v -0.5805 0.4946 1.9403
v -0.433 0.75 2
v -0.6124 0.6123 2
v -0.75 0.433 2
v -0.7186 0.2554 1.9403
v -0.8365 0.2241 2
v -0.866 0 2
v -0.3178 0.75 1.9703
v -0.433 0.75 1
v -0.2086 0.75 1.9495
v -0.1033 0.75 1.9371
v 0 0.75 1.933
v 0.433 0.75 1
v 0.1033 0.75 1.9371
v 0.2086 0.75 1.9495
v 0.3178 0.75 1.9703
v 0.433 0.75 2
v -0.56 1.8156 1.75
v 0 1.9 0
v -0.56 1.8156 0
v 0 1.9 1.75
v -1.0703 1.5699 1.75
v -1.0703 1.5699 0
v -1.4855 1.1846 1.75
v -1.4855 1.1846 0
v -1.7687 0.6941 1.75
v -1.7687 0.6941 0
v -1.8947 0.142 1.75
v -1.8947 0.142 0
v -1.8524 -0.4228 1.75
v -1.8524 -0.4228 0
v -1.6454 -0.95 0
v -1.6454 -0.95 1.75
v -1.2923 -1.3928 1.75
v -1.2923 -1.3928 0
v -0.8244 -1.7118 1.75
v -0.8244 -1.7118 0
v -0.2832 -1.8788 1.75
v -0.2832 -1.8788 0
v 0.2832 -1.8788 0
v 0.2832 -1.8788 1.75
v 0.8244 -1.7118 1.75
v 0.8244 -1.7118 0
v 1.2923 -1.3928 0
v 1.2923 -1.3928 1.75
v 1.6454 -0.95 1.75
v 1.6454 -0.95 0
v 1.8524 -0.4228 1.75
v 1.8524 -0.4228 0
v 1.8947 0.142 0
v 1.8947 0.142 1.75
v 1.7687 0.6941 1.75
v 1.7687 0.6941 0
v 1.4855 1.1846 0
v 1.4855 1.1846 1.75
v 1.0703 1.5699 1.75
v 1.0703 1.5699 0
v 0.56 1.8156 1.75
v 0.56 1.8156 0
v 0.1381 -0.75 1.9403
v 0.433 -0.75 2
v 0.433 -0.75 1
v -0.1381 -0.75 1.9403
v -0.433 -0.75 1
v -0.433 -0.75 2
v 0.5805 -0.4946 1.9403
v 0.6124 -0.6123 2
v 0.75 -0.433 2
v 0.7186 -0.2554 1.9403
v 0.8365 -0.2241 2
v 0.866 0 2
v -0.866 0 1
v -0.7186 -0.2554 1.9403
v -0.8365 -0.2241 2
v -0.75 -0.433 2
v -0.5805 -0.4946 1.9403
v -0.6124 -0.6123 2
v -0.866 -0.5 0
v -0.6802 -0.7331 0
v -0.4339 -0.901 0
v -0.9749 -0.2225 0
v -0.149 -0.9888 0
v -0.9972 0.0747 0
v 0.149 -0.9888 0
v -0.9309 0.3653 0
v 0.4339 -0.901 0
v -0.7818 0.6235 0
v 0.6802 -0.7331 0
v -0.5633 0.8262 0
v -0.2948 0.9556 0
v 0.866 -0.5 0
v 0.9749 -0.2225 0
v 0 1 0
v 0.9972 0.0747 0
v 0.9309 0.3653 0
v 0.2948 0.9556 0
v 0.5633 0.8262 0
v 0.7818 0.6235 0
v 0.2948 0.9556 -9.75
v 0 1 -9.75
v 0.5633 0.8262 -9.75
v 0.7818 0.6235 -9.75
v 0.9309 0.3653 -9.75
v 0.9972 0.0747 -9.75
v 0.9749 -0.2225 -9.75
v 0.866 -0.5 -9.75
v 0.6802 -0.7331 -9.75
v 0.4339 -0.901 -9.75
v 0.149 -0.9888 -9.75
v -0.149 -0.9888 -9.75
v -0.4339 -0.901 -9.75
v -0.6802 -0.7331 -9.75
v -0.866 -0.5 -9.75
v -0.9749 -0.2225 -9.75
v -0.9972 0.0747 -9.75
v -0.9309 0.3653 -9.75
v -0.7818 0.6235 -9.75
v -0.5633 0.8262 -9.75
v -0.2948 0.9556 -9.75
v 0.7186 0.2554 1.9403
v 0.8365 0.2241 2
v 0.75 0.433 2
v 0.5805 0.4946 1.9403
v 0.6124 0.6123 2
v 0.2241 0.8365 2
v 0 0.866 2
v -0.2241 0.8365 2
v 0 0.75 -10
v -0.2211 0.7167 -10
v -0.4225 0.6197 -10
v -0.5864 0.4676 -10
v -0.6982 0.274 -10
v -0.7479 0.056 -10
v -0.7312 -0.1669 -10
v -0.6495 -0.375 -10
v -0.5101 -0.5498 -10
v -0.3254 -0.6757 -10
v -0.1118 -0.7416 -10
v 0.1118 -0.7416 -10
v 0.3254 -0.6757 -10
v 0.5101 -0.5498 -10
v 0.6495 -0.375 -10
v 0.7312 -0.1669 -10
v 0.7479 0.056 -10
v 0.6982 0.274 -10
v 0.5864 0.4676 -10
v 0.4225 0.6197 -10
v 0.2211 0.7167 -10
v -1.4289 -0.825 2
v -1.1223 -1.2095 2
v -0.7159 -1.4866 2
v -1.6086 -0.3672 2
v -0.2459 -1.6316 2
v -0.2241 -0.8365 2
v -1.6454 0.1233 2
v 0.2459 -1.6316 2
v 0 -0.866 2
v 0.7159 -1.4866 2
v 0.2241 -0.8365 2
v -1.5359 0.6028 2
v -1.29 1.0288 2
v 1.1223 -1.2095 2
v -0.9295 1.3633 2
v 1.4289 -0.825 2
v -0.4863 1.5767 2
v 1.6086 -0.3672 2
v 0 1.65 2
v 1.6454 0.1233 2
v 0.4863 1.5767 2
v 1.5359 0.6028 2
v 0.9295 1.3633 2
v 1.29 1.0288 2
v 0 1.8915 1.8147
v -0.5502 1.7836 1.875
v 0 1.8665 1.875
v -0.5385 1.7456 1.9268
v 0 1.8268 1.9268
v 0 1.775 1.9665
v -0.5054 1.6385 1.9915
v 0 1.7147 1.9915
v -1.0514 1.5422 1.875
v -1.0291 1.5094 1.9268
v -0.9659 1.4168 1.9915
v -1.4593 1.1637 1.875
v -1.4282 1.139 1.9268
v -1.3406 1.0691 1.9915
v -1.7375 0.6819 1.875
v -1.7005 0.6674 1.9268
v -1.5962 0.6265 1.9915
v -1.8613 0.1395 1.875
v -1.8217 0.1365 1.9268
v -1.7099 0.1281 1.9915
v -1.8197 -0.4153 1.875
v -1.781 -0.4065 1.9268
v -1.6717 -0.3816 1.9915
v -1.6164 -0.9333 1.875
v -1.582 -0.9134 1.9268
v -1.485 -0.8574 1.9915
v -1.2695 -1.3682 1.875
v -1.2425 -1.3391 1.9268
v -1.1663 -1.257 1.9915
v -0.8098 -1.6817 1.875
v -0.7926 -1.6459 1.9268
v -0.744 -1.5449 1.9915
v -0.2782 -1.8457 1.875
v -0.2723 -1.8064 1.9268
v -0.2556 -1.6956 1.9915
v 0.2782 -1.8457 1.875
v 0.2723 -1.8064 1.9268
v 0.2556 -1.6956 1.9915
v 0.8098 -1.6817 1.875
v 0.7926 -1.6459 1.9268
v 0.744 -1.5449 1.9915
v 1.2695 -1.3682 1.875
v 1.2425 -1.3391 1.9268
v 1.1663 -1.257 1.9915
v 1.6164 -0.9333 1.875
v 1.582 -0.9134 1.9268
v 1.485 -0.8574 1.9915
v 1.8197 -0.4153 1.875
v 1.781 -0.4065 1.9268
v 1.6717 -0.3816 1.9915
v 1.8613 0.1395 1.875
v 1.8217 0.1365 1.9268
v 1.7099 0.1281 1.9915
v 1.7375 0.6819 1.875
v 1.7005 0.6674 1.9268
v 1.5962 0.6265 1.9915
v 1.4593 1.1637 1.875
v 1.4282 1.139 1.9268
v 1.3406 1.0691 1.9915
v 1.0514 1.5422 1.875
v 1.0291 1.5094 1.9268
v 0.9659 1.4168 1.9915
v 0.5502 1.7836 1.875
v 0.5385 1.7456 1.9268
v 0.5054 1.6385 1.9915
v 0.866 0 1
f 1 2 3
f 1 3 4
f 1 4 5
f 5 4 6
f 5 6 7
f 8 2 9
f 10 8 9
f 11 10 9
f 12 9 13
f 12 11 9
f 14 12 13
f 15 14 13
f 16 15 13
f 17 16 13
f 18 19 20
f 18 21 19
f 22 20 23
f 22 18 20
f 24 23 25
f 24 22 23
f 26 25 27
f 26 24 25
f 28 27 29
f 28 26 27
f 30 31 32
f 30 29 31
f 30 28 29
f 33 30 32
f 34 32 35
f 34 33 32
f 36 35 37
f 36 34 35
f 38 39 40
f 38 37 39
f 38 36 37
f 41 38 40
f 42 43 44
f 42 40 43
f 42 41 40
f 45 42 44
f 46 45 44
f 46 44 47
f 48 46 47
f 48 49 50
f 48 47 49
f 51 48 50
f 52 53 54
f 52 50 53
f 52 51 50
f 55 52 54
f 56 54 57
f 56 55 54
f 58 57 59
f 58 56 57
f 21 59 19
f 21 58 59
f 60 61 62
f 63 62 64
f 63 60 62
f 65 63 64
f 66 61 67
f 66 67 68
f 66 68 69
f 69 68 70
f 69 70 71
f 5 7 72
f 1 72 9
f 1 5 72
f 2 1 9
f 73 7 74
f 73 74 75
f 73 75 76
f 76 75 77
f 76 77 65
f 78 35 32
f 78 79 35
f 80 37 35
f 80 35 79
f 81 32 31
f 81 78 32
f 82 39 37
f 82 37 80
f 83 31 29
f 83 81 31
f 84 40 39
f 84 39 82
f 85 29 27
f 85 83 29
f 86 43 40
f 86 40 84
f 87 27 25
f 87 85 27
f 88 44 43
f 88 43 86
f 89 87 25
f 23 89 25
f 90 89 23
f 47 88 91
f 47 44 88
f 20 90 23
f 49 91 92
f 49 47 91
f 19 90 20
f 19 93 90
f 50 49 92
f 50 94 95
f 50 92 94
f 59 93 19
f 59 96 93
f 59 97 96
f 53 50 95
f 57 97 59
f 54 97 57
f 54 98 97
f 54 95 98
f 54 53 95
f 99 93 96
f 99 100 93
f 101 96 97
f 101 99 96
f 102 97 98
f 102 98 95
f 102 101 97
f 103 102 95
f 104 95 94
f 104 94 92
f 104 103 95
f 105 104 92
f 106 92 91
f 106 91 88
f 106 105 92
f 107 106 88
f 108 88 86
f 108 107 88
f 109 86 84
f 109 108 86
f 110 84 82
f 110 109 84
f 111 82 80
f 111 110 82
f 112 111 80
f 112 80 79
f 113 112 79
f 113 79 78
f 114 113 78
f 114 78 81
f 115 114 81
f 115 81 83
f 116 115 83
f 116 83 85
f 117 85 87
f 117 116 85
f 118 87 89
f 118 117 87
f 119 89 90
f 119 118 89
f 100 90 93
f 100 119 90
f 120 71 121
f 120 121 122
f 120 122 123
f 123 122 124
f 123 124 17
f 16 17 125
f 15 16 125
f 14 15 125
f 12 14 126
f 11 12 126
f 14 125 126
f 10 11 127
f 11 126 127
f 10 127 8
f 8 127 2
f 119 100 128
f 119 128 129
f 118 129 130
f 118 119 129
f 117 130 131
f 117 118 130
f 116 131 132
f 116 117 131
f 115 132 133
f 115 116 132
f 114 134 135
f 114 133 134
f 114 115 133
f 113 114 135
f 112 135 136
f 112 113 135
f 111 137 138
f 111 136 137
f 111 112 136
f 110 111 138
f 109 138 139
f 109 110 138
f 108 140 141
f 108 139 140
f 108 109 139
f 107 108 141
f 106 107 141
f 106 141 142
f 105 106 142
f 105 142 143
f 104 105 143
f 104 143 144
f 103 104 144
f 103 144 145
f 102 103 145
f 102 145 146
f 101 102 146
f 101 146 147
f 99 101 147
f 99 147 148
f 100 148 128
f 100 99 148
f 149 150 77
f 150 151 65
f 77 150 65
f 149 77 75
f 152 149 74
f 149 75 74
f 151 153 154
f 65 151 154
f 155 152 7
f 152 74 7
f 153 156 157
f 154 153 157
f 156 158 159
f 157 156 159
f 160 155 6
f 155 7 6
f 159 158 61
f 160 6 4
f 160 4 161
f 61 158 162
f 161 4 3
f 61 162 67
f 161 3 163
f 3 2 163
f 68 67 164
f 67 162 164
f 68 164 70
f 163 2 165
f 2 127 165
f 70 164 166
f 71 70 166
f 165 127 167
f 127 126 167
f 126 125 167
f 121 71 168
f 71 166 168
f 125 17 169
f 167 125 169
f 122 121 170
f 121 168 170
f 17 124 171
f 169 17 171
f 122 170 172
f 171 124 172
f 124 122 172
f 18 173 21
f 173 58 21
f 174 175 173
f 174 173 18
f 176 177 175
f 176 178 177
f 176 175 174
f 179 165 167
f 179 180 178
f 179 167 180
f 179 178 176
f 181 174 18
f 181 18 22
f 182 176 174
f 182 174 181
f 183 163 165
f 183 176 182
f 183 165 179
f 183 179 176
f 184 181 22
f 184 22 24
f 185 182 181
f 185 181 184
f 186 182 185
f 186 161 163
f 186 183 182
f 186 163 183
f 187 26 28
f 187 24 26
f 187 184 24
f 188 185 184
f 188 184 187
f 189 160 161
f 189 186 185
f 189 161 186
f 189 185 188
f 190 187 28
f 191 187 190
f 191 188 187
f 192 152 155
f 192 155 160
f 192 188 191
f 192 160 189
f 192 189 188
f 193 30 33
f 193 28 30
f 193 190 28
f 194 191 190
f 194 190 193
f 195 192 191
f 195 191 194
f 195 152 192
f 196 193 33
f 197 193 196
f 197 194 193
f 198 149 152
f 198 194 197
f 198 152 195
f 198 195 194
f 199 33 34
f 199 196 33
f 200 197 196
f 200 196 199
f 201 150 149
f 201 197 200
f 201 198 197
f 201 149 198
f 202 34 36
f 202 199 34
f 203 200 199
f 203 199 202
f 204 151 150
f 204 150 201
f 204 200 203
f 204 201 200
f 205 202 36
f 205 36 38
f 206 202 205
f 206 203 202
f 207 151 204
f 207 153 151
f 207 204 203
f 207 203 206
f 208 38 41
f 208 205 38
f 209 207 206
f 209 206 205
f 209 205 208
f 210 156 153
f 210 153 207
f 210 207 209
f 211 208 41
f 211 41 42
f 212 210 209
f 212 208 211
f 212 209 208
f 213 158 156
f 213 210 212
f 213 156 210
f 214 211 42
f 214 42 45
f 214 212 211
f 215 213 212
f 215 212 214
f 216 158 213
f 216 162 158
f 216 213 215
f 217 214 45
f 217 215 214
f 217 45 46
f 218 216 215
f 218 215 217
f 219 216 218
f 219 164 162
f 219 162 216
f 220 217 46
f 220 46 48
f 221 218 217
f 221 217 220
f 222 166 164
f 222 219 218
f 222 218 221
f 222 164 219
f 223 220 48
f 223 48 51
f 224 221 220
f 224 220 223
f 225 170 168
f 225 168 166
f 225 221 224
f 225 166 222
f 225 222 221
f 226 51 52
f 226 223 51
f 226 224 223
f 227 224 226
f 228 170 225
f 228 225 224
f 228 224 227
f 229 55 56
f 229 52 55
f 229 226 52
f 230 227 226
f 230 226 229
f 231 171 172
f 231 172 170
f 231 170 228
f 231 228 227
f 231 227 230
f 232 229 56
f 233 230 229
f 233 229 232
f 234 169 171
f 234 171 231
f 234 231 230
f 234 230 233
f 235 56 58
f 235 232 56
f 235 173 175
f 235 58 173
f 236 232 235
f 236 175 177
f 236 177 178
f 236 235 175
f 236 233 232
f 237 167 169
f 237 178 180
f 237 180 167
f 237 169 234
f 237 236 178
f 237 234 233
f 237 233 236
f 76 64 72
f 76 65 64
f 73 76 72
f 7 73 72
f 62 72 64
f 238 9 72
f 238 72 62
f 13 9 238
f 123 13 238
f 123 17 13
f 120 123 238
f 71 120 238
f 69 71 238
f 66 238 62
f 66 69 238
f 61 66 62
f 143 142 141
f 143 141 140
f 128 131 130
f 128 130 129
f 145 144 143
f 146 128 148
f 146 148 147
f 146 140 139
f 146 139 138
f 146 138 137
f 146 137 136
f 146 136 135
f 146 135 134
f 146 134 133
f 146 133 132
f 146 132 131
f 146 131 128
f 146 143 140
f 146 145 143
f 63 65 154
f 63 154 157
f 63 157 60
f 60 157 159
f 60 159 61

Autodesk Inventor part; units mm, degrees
ref_plane "YZ Plane" through (0, 0, 0) normal (1, 0, 0) x (0, 1, 0)
ref_plane "XZ Plane" through (0, 0, 0) normal (0, 1, 0) x (-1, 0, 0)
ref_plane "XY Plane" through (0, 0, 0) normal (0, 0, 1) x (1, 0, 0)
sketch "スケッチ1" plane through (0, 0, 0) normal (1, 0, 0) x (0, 1, 0)
  line L0 (0, 0) -> (1, 0) construction
  line L1 (1.9, 0) -> (1.9, 1.75)
  line L2 (1.65, 2) -> (0.866, 2)
  line L3 (0, 2) -> (0, 1.5) construction
  line L4 (1, 0) -> (1, -10)
  line L5 (1, -10) -> (0, -10)
  line L6 (0, -10) -> (0, 0)
  line L7 (1, 0) -> (1.9, 0)
  line L8 (0.866, 2) -> (0.433, 1.25) construction
  line L9 (0.433, 1.25) -> (-0.433, 1.25) construction
  line L10 (-0.433, 1.25) -> (-0.866, 2) construction
  line L11 (-0.866, 2) -> (-0.433, 2.75) construction
  line L12 (-0.433, 2.75) -> (0.433, 2.75) construction
  line L13 (0.433, 2.75) -> (0.866, 2) construction
  line L14 (0.866, 2) -> (0, 1.5)
  line L15 (0.866, 2) -> (0, 2) construction
  line L16 (0, 1.5) -> (0, 0)
  arc A0 (1.9, 1.75) -> (1.65, 2) centre (1.65, 1.75) ccw
  dimension "d0" = 1.5
  dimension "d1" = 3.8
  dimension "d2" = 2
  dimension "d3" = 10
  dimension "d4" = 2
  dimension "d6" = 0.25
  dimension "d11" = 30
revolve "回転1" add sketch "スケッチ1" angle 360 about axis through (0, 0, 1.5) along (0, 0, -1)
sketch "スケッチ2" plane through (0, 0, 2) normal (0, 0, 1) x (1, 0, 0)
  line L0 (0.866, 0) -> (0.433, -0.75)
  line L1 (0.433, -0.75) -> (-0.433, -0.75)
  line L2 (-0.433, -0.75) -> (-0.866, 0)
  line L3 (-0.866, 0) -> (-0.433, 0.75)
  line L4 (-0.433, 0.75) -> (0.433, 0.75)
  line L5 (0.433, 0.75) -> (0.866, 0)
  point P0 (0, 0)
  point P1 (0, 0)
  dimension "d8" = 1.5
extrude "押し出し1" cut sketch "スケッチ2" against normal blind 1
chamfer "面取り1" distance 0.25 angle 45 1 edges at (0, -1, -10)
properties part number "10_053_CAP_BOLT_M2X10_R1" material "鋼、炭素鋼"
